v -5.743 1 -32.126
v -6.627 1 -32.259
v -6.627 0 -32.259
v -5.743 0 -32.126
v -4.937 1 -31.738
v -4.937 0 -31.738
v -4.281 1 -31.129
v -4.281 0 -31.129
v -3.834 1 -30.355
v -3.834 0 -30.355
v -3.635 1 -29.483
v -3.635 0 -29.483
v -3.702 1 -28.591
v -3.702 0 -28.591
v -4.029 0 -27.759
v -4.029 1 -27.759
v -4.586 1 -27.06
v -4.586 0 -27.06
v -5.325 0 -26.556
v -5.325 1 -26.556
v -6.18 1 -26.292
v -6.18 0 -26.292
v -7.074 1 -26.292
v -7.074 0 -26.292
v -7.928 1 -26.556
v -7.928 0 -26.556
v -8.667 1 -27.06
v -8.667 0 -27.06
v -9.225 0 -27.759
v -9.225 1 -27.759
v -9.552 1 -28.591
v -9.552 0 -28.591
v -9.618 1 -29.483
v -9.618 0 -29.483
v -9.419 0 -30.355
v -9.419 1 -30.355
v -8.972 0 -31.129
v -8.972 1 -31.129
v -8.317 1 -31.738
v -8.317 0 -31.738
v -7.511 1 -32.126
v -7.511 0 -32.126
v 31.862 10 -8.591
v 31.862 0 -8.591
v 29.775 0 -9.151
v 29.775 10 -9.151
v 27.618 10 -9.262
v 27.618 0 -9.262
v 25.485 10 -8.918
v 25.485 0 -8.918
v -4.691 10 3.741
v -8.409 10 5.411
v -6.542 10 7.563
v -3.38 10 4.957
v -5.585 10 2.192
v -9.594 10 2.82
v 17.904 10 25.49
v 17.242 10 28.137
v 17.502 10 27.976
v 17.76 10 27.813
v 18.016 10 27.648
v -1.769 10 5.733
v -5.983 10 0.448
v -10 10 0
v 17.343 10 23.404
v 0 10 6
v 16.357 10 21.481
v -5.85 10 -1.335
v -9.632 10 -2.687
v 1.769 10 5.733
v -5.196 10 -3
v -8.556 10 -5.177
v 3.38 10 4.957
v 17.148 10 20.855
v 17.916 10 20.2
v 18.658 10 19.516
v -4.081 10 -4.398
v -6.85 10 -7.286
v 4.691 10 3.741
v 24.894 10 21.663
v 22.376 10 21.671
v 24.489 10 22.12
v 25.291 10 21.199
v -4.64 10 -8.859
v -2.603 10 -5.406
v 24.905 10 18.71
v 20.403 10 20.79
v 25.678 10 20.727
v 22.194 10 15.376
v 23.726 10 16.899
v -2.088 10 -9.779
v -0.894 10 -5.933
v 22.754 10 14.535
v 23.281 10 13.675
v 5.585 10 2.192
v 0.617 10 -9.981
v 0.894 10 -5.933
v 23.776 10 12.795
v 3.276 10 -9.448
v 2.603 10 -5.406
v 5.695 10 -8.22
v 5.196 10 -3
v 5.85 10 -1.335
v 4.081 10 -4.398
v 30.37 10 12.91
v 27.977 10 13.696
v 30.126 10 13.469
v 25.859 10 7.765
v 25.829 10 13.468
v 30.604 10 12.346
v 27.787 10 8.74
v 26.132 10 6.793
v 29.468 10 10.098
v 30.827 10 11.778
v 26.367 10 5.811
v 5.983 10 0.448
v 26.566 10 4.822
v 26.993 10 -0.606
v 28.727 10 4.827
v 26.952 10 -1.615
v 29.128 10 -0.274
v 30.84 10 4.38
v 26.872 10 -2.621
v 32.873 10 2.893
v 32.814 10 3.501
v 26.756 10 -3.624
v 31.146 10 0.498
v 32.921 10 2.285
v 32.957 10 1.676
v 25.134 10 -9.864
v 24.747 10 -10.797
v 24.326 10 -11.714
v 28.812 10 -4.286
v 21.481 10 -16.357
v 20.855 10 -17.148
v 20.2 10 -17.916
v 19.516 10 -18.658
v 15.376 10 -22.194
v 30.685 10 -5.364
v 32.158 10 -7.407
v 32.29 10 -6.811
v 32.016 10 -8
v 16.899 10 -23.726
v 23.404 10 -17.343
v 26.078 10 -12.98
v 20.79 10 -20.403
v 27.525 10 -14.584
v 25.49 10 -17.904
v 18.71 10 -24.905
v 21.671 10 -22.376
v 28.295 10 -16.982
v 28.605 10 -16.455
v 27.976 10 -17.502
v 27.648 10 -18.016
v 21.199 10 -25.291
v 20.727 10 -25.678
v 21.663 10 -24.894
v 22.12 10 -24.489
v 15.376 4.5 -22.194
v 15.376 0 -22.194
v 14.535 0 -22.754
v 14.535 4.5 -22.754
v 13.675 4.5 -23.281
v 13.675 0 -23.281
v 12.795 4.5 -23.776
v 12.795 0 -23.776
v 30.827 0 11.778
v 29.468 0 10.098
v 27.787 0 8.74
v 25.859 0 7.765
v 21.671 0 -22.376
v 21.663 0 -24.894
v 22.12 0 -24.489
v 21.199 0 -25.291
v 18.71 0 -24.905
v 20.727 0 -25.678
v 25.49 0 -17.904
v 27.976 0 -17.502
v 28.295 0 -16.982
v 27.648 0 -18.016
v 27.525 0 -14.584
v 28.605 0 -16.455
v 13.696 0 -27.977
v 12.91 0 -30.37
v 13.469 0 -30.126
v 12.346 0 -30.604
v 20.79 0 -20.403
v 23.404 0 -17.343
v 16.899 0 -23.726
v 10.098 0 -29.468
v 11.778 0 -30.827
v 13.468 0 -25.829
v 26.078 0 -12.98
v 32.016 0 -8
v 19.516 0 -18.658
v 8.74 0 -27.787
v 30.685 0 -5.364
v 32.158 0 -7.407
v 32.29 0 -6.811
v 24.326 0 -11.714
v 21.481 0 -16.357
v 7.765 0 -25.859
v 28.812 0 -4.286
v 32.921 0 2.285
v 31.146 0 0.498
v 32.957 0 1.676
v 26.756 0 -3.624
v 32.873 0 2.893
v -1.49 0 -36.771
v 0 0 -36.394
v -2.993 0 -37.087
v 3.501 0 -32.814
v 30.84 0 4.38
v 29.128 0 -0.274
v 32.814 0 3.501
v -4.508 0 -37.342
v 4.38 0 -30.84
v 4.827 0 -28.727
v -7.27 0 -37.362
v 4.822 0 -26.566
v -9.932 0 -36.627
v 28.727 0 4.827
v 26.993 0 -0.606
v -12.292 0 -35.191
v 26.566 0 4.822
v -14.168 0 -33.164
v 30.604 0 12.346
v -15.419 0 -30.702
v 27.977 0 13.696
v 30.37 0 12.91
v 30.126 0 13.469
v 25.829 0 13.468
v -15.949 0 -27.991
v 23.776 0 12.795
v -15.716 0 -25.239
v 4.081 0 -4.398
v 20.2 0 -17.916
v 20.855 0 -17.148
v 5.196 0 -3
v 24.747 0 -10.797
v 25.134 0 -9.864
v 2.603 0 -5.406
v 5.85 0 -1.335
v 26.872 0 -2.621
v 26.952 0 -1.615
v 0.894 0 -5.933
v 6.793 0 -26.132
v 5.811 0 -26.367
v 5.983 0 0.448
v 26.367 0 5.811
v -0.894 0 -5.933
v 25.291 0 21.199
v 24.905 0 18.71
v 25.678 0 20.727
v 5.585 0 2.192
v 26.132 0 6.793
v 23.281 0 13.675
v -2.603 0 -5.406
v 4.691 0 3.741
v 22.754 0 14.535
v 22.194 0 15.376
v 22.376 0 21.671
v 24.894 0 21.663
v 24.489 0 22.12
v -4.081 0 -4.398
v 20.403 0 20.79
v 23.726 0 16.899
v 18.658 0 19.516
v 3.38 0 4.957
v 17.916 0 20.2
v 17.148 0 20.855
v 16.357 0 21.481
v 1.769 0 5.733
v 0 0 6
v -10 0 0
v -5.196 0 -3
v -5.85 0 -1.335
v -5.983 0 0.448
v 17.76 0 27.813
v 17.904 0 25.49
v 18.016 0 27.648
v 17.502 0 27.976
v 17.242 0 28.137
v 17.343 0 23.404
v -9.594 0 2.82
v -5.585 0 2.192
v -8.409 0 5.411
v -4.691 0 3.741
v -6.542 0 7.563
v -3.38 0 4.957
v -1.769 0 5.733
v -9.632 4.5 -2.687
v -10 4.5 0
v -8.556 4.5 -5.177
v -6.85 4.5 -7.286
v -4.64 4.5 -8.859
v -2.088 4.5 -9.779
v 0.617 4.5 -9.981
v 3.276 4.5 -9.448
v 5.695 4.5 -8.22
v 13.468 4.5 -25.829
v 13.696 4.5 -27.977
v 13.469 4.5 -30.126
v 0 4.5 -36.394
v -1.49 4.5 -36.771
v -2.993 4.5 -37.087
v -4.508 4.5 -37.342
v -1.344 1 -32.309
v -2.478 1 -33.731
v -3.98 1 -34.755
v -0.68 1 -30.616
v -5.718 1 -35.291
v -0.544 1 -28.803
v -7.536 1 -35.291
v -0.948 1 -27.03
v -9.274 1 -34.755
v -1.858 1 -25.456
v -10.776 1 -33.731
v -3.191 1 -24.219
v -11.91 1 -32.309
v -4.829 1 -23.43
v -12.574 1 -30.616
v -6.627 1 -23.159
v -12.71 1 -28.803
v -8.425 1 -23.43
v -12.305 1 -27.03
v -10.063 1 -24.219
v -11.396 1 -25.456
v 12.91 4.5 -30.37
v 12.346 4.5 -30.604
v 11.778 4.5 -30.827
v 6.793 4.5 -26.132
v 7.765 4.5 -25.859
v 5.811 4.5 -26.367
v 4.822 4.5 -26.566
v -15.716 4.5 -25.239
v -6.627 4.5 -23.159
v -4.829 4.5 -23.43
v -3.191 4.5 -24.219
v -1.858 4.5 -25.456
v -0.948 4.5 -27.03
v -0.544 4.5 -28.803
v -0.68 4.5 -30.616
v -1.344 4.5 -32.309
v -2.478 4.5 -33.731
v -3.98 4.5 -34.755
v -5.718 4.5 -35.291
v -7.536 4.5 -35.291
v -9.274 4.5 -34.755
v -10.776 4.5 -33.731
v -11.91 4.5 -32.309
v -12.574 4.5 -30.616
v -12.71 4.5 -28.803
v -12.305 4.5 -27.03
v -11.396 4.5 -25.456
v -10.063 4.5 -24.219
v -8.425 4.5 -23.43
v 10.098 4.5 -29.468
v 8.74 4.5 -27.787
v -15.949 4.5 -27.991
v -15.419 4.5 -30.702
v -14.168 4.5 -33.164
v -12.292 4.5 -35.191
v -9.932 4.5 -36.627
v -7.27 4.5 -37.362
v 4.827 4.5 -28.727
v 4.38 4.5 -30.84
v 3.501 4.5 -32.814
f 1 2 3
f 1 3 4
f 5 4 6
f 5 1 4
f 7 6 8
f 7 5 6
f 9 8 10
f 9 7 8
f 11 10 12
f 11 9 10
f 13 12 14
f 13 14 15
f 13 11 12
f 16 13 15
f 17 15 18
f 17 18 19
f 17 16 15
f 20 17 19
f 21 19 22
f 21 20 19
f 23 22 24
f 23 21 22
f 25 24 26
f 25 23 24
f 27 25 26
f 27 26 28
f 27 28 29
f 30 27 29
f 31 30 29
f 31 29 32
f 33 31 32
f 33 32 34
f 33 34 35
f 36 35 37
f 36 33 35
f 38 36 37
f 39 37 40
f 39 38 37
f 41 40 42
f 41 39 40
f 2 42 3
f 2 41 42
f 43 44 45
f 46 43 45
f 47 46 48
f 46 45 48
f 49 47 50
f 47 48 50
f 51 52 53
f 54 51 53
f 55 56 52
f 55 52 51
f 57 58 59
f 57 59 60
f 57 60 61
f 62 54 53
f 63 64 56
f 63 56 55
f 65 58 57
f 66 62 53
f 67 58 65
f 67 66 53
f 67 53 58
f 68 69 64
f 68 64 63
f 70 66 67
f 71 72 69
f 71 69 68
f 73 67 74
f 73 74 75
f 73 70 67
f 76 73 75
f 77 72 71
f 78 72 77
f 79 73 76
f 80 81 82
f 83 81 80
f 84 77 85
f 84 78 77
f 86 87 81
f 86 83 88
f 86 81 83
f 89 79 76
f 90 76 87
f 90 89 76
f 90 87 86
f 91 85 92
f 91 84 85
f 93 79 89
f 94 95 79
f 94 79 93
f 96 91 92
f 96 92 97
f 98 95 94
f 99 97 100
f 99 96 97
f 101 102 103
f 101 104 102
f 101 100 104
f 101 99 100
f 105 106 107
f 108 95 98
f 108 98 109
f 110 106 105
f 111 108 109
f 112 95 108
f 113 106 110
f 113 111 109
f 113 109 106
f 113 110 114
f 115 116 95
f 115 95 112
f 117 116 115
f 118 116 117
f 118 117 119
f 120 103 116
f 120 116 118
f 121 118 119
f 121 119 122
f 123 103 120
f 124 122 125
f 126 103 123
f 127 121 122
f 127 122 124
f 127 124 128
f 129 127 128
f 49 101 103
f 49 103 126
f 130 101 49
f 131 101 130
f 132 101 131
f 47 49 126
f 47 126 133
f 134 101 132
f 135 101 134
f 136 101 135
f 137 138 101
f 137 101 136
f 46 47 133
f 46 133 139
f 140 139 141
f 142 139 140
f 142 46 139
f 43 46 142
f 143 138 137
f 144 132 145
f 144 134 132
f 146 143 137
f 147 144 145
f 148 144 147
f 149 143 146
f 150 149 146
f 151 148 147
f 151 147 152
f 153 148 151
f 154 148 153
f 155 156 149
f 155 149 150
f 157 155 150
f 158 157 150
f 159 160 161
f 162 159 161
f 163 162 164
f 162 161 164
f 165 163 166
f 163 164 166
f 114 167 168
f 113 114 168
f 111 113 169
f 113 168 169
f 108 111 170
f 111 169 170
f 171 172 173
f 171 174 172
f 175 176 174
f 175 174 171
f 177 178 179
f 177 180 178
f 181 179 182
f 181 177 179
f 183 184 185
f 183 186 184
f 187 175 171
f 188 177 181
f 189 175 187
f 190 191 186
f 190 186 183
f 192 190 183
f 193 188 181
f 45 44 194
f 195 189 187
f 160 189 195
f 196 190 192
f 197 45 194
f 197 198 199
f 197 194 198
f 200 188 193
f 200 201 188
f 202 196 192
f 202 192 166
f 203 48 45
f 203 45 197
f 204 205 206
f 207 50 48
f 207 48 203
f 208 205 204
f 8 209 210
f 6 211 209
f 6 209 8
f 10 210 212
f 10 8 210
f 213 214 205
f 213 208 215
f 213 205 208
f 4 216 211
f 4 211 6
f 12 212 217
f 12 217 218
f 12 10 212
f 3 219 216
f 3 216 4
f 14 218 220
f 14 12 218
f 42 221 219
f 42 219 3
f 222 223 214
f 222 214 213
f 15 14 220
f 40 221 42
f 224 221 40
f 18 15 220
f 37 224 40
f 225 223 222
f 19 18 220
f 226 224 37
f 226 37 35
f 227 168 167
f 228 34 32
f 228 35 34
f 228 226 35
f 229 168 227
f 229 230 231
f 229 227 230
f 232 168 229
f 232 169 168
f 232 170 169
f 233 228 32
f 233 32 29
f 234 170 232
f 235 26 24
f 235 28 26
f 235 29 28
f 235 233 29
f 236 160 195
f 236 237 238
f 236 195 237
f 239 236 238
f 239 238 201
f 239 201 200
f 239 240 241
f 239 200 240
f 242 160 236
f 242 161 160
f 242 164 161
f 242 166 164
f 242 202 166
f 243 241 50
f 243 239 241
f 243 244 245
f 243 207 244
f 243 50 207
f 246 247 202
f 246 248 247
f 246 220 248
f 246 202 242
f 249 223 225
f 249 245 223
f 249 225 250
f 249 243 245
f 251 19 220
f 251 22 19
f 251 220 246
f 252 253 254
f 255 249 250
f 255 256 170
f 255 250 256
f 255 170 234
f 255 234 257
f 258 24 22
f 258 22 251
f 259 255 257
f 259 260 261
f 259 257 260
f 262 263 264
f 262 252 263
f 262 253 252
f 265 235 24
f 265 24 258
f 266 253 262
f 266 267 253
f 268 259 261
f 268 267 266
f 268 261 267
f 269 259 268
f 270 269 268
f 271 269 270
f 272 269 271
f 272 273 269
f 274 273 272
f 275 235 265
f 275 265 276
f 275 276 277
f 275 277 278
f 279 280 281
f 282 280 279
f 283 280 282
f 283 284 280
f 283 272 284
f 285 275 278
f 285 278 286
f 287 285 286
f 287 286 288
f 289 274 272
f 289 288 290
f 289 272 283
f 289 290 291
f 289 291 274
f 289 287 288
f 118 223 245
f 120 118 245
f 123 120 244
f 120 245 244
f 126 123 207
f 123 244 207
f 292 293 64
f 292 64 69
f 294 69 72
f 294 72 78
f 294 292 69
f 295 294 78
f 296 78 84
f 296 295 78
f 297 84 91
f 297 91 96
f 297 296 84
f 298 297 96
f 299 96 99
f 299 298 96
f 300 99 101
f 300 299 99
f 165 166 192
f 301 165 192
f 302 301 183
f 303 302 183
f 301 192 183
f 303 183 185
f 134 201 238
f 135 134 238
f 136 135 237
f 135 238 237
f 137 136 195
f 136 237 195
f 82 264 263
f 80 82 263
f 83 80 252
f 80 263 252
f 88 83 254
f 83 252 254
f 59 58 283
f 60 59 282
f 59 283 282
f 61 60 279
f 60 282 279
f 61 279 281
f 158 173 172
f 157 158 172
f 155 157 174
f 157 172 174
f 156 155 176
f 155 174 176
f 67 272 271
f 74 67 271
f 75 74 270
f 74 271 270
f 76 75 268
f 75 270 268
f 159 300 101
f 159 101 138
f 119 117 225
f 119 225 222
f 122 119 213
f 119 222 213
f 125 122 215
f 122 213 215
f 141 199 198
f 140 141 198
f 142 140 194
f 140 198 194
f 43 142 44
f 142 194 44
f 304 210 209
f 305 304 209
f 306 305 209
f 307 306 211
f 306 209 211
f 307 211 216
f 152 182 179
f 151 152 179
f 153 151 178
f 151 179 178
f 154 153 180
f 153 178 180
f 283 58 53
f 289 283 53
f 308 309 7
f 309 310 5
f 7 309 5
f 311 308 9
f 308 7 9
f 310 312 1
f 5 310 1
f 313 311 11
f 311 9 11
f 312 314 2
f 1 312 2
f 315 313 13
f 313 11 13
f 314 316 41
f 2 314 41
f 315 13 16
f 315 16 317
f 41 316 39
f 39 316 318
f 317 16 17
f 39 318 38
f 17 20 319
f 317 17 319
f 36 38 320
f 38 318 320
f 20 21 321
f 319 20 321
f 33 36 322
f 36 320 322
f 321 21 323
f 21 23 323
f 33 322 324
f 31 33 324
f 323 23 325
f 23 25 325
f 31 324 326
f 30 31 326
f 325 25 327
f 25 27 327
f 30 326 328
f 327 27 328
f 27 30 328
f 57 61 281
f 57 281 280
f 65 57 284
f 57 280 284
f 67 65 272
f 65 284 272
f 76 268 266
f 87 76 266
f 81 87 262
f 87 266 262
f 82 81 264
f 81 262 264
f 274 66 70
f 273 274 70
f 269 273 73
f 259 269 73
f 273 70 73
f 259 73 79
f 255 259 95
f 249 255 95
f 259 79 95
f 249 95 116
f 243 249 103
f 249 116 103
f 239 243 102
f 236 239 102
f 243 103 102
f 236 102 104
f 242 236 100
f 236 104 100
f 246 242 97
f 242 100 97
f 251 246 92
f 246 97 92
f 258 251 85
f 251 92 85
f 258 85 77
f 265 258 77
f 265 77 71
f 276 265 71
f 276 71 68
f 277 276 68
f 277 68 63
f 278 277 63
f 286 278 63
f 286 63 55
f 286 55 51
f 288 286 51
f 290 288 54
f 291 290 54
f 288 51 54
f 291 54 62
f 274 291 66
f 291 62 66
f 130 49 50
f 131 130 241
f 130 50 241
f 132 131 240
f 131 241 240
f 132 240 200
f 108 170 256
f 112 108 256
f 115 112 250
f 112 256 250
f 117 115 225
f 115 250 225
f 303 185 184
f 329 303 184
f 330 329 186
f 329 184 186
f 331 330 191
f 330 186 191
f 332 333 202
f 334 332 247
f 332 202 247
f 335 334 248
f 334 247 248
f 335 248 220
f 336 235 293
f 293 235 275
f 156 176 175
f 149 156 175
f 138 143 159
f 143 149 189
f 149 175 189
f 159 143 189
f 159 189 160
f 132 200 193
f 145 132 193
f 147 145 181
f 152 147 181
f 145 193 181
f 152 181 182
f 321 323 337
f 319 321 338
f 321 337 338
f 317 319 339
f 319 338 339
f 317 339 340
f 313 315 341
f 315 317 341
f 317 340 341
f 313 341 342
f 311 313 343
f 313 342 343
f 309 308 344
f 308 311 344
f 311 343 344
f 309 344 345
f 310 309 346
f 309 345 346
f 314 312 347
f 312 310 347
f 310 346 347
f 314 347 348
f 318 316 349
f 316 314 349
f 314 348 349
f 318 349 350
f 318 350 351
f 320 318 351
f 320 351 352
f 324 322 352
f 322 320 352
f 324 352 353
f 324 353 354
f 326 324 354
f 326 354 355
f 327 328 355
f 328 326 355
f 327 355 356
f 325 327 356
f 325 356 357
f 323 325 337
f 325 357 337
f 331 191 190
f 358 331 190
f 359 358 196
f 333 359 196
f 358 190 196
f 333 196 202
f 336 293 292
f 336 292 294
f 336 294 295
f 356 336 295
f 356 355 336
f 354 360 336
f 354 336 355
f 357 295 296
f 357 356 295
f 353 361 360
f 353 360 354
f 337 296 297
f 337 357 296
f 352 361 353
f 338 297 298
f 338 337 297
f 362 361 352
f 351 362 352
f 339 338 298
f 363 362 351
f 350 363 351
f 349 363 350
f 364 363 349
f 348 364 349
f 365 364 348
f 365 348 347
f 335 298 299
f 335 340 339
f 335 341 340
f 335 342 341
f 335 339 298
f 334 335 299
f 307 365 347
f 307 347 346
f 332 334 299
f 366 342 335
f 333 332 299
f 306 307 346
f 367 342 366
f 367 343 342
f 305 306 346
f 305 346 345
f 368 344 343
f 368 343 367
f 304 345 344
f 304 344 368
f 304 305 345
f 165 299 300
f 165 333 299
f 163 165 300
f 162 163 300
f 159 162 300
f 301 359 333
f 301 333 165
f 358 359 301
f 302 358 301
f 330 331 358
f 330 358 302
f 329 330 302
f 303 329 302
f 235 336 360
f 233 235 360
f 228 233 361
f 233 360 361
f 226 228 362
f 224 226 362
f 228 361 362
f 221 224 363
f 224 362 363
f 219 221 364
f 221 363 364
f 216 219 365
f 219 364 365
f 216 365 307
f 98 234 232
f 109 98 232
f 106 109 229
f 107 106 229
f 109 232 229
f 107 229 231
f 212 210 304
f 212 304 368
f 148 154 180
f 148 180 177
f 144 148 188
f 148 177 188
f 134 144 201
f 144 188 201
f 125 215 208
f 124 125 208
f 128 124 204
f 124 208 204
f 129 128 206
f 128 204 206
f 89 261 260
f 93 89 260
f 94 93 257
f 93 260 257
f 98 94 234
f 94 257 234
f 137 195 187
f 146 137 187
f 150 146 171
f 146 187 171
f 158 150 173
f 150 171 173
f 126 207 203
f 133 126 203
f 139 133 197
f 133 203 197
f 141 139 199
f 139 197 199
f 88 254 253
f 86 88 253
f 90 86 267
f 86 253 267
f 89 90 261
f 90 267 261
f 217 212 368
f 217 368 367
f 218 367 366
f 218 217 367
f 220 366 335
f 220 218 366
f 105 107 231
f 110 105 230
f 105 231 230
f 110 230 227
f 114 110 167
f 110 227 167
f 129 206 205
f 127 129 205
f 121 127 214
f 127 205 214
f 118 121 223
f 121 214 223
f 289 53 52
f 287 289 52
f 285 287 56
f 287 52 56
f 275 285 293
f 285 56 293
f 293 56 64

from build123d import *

# Parameters (mm, degrees)
SKETCH_1_R          = 27
EXTRUDE_2_DEPTH     = 10
EXTRUDE_START       = -10
EXTRUDE_3_DEPTH     = 10
CUT_EXTRUDE_2_DEPTH = 48.669538272
SKETCH_6_R          = 6
CUT_EXTRUDE_3_DEPTH = 10
EXTRUDE_5_DEPTH     = 10
SKETCH_10_R         = 6.1
CUT_EXTRUDE_5_DEPTH = 10
CUT_EXTRUDE_START   = -10
CUT_EXTRUDE_6_DEPTH = 10
FILLET_1_R          = 10
CUT_EXTRUDE_START_2 = -5.5
SKETCH_14_R         = 6.1
CUT_EXTRUDE_7_DEPTH = 5.5
EXTRUDE_START_2     = -1
SKETCH_15_R         = 6.1
SKETCH_15_R_2       = 3
EXTRUDE_6_DEPTH     = 1


with BuildPart() as part:
    # 草图1 → 凸台-拉伸2 (new body)
    with BuildSketch(Plane(origin=(0, 0, 0), x_dir=(1, 0, 0), z_dir=(0, 1, 0))):
        with Locations(Location((0, 0, 0), (0, 0, 270))):
            Circle(SKETCH_1_R)
    extrude(amount=EXTRUDE_2_DEPTH)

    # 草图3 → 凸台-拉伸3 (add)
    with BuildSketch(Plane(origin=(0, 10, 0), x_dir=(1, 0, 0), z_dir=(0, 1, 0)).offset(EXTRUDE_START)):
        with BuildLine():
            ThreePointArc((-3.623654542, 26.755730746), (-4.775668185, 29.776890365), (-6.810627033, 32.289554959))
            ThreePointArc((-6.810627033, 32.289554959), (-7.703697007, 32.088207373), (-8.590838072, 31.862164101))
            ThreePointArc((-8.590838072, 31.862164101), (-9.263273827, 28.699511571), (-8.918147734, 25.484635391))
            ThreePointArc((-8.918147734, 25.484635391), (-6.303024824, 26.253987851), (-3.623654542, 26.755730746))
        make_face()
        with BuildLine():
            ThreePointArc((-11.714275763, 24.326441239), (-13.743495509, 26.843742988), (-16.455312443, 28.604592156))
            ThreePointArc((-16.455312443, 28.604592156), (-17.242452636, 28.137125424), (-18.016322714, 27.648003832))
            ThreePointArc((-18.016322714, 27.648003832), (-17.678533741, 24.432348458), (-16.356847947, 21.481469346))
            ThreePointArc((-16.356847947, 21.481469346), (-14.107461247, 23.021284438), (-11.714275763, 24.326441239))
        make_face()
        with BuildLine():
            ThreePointArc((-18.658222053, 19.515910171), (-21.366013737, 21.282943016), (-24.48923722, 22.119612574))
            ThreePointArc((-24.48923722, 22.119612574), (-25.093396865, 21.431785595), (-25.678244161, 20.727464312))
            ThreePointArc((-25.678244161, 20.727464312), (-24.363295599, 17.773576848), (-22.194425918, 15.375547411))
            ThreePointArc((-22.194425918, 15.375547411), (-20.530961071, 17.535097305), (-18.658222053, 19.515910171))
        make_face()
        with BuildLine():
            ThreePointArc((-23.77577157, 12.79502584), (-26.897077674, 13.638820294), (-30.125984831, 13.469411196))
            ThreePointArc((-30.125984831, 13.469411196), (-30.488024573, 12.628553268), (-30.826600159, 11.777976169))
            ThreePointArc((-30.826600159, 11.777976169), (-28.663208335, 9.3750037), (-25.859458842, 7.764559768))
            ThreePointArc((-25.859458842, 7.764559768), (-24.944747378, 10.332452674), (-23.77577157, 12.79502584))
        make_face()
        with BuildLine():
            ThreePointArc((-26.56598291, 4.821675232), (-29.795268245, 4.659634815), (-32.813791147, 3.500730003))
            ThreePointArc((-32.813791147, 3.500730003), (-32.898272013, 2.589150159), (-32.957433752, 1.675577656))
            ThreePointArc((-32.957433752, 1.675577656), (-30.15736653, 0.05873987), (-26.993187762, -0.606477084))
            ThreePointArc((-26.993187762, -0.606477084), (-26.916768011, 2.118395585), (-26.56598291, 4.821675232))
        make_face()
        with BuildLine():
            ThreePointArc((-32.289554959, -6.810627033), (-32.088207373, -7.703697007), (-31.862164101, -8.590838072))
            ThreePointArc((-31.862164101, -8.590838072), (-28.699511571, -9.263273827), (-25.484635391, -8.918147734))
            ThreePointArc((-25.484635391, -8.918147734), (-26.253987851, -6.303024824), (-26.755730746, -3.623654542))
            ThreePointArc((-26.755730746, -3.623654542), (-29.776890365, -4.775668185), (-32.289554959, -6.810627033))
        make_face()
        with BuildLine():
            ThreePointArc((-28.604592156, -16.455312443), (-28.137125424, -17.242452636), (-27.648003832, -18.016322714))
            ThreePointArc((-27.648003832, -18.016322714), (-24.432348458, -17.678533741), (-21.481469346, -16.356847947))
            ThreePointArc((-21.481469346, -16.356847947), (-23.021284438, -14.107461247), (-24.326441239, -11.714275763))
            ThreePointArc((-24.326441239, -11.714275763), (-26.843742988, -13.743495509), (-28.604592156, -16.455312443))
        make_face()
        with BuildLine():
            ThreePointArc((-22.119612574, -24.48923722), (-21.431785595, -25.093396865), (-20.727464312, -25.678244161))
            ThreePointArc((-20.727464312, -25.678244161), (-17.773576848, -24.363295599), (-15.375547411, -22.194425918))
            ThreePointArc((-15.375547411, -22.194425918), (-17.535097305, -20.530961071), (-19.515910171, -18.658222053))
            ThreePointArc((-19.515910171, -18.658222053), (-21.282943016, -21.366013737), (-22.119612574, -24.48923722))
        make_face()
        with BuildLine():
            ThreePointArc((-13.469411196, -30.125984831), (-12.628553268, -30.488024573), (-11.777976169, -30.826600159))
            ThreePointArc((-11.777976169, -30.826600159), (-9.3750037, -28.663208335), (-7.764559768, -25.859458842))
            ThreePointArc((-7.764559768, -25.859458842), (-10.332452674, -24.944747378), (-12.79502584, -23.77577157))
            ThreePointArc((-12.79502584, -23.77577157), (-13.638820294, -26.897077674), (-13.469411196, -30.125984831))
        make_face()
        with BuildLine():
            ThreePointArc((-3.500730003, -32.813791147), (-2.589150159, -32.898272013), (-1.675577656, -32.957433752))
            ThreePointArc((-1.675577656, -32.957433752), (-0.05873987, -30.15736653), (0.606477084, -26.993187762))
            ThreePointArc((0.606477084, -26.993187762), (-2.118395585, -26.916768011), (-4.821675232, -26.56598291))
            ThreePointArc((-4.821675232, -26.56598291), (-4.659634815, -29.795268245), (-3.500730003, -32.813791147))
        make_face()
        with BuildLine():
            ThreePointArc((6.810627033, -32.289554959), (7.703697007, -32.088207373), (8.590838072, -31.862164101))
            ThreePointArc((8.590838072, -31.862164101), (9.263273827, -28.699511571), (8.918147734, -25.484635391))
            ThreePointArc((8.918147734, -25.484635391), (6.303024824, -26.253987851), (3.623654542, -26.755730746))
            ThreePointArc((3.623654542, -26.755730746), (4.775668185, -29.776890365), (6.810627033, -32.289554959))
        make_face()
        with BuildLine():
            ThreePointArc((16.455312443, -28.604592156), (17.242452636, -28.137125424), (18.016322714, -27.648003832))
            ThreePointArc((18.016322714, -27.648003832), (17.678533741, -24.432348458), (16.356847947, -21.481469346))
            ThreePointArc((16.356847947, -21.481469346), (14.107461247, -23.021284438), (11.714275763, -24.326441239))
            ThreePointArc((11.714275763, -24.326441239), (13.743495509, -26.843742988), (16.455312443, -28.604592156))
        make_face()
        with BuildLine():
            ThreePointArc((24.48923722, -22.119612574), (25.093396865, -21.431785595), (25.678244161, -20.727464312))
            ThreePointArc((25.678244161, -20.727464312), (24.363295599, -17.773576848), (22.194425918, -15.375547411))
            ThreePointArc((22.194425918, -15.375547411), (20.530961071, -17.535097305), (18.658222053, -19.515910171))
            ThreePointArc((18.658222053, -19.515910171), (21.366013737, -21.282943016), (24.48923722, -22.119612574))
        make_face()
        with BuildLine():
            ThreePointArc((30.125984831, -13.469411196), (30.488024573, -12.628553268), (30.826600159, -11.777976169))
            ThreePointArc((30.826600159, -11.777976169), (28.663208335, -9.3750037), (25.859458842, -7.764559768))
            ThreePointArc((25.859458842, -7.764559768), (24.944747378, -10.332452674), (23.77577157, -12.79502584))
            ThreePointArc((23.77577157, -12.79502584), (26.897077674, -13.638820294), (30.125984831, -13.469411196))
        make_face()
        with BuildLine():
            ThreePointArc((32.813791147, -3.500730003), (32.898272013, -2.589150159), (32.957433752, -1.675577656))
            ThreePointArc((32.957433752, -1.675577656), (30.15736653, -0.05873987), (26.993187762, 0.606477084))
            ThreePointArc((26.993187762, 0.606477084), (26.998296887, 0.303257671), (27, 0))
            ThreePointArc((27, 0), (26.891276825, -2.420584789), (26.56598291, -4.821675232))
            ThreePointArc((26.56598291, -4.821675232), (29.795268245, -4.659634815), (32.813791147, -3.500730003))
        make_face()
        with BuildLine():
            ThreePointArc((26.755730746, 3.623654542), (29.776890365, 4.775668185), (32.289554959, 6.810627033))
            ThreePointArc((32.289554959, 6.810627033), (32.088207373, 7.703697007), (31.862164101, 8.590838072))
            ThreePointArc((31.862164101, 8.590838072), (28.699511571, 9.263273827), (25.484635391, 8.918147734))
            ThreePointArc((25.484635391, 8.918147734), (26.253987851, 6.303024824), (26.755730746, 3.623654542))
        make_face()
        with BuildLine():
            ThreePointArc((24.326441239, 11.714275763), (26.843742988, 13.743495509), (28.604592156, 16.455312443))
            ThreePointArc((28.604592156, 16.455312443), (28.137125424, 17.242452636), (27.648003832, 18.016322714))
            ThreePointArc((27.648003832, 18.016322714), (24.432348458, 17.678533741), (21.481469346, 16.356847947))
            ThreePointArc((21.481469346, 16.356847947), (23.021284438, 14.107461247), (24.326441239, 11.714275763))
        make_face()
        with BuildLine():
            ThreePointArc((19.515910171, 18.658222053), (21.282943016, 21.366013737), (22.119612574, 24.48923722))
            ThreePointArc((22.119612574, 24.48923722), (21.431785595, 25.093396865), (20.727464312, 25.678244161))
            ThreePointArc((20.727464312, 25.678244161), (17.773576848, 24.363295599), (15.375547411, 22.194425918))
            ThreePointArc((15.375547411, 22.194425918), (17.535097305, 20.530961071), (19.515910171, 18.658222053))
        make_face()
        with BuildLine():
            ThreePointArc((12.79502584, 23.77577157), (13.638820294, 26.897077674), (13.469411196, 30.125984831))
            ThreePointArc((13.469411196, 30.125984831), (12.628553268, 30.488024573), (11.777976169, 30.826600159))
            ThreePointArc((11.777976169, 30.826600159), (9.3750037, 28.663208335), (7.764559768, 25.859458842))
            ThreePointArc((7.764559768, 25.859458842), (10.332452674, 24.944747378), (12.79502584, 23.77577157))
        make_face()
        with BuildLine():
            ThreePointArc((4.821675232, 26.56598291), (4.659634815, 29.795268245), (3.500730003, 32.813791147))
            ThreePointArc((3.500730003, 32.813791147), (2.589150159, 32.898272013), (1.675577656, 32.957433752))
            ThreePointArc((1.675577656, 32.957433752), (0.05873987, 30.15736653), (-0.606477084, 26.993187762))
            ThreePointArc((-0.606477084, 26.993187762), (2.118395585, 26.916768011), (4.821675232, 26.56598291))
        make_face()
    extrude(amount=EXTRUDE_3_DEPTH)

    # 草图4 → 切除-拉伸2 (cut, through all)
    with BuildSketch(Plane(origin=(0, 10, 0), x_dir=(1, 0, 0), z_dir=(0, 1, 0))):
        with BuildLine():
            Line((68.70942434, -72.656830422), (-6.542169106, -7.563069707))
            ThreePointArc((-6.542169106, -7.563069707), (-9.614988938, -2.748088014), (-9.550796477, 2.963492306))
            Line((-9.550796477, 2.963492306), (-2.118395585, 26.916768011))
            Line((-2.118395585, 26.916768011), (19.935579671, 97.992717399))
            ThreePointArc((19.935579671, 97.992717399), (-96.149889375, -27.480880138), (68.70942434, -72.656830422))
        make_face()
    extrude(amount=-CUT_EXTRUDE_2_DEPTH, mode=Mode.SUBTRACT)

    # 草图6 → 切除-拉伸3 (cut)
    with BuildSketch(Plane(origin=(0, 10, 0), x_dir=(1, 0, 0), z_dir=(0, 1, 0))):
        with Locations(Location((0, 0, 0), (0, 0, 270))):
            Circle(SKETCH_6_R)
    extrude(amount=-CUT_EXTRUDE_3_DEPTH, mode=Mode.SUBTRACT)

    # 草图9 → 凸台-拉伸5 (add)
    with BuildSketch(Plane(origin=(0, 10, 0), x_dir=(1, 0, 0), z_dir=(0, 1, 0)).offset(EXTRUDE_START)):
        with BuildLine():
            Line((-18.337271569, 36.810995995), (-10, 0))
            ThreePointArc((-10, 0), (-9.887061363, 1.49867195), (-9.550796477, 2.963492306))
            Line((-9.550796477, 2.963492306), (-2.118395585, 26.916768011))
            ThreePointArc((-2.118395585, 26.916768011), (-1.362972032, 26.965576338), (-0.606477084, 26.993187762))
            ThreePointArc((-0.606477084, 26.993187762), (0.05873987, 30.15736653), (1.675577656, 32.957433752))
            ThreePointArc((1.675577656, 32.957433752), (2.589150159, 32.898272013), (3.500730003, 32.813791147))
            ThreePointArc((3.500730003, 32.813791147), (4.659634815, 29.795268245), (4.821675232, 26.56598291))
            Line((4.821675232, 26.56598291), (7.168022985, 33.612773021))
            ThreePointArc((7.168022985, 33.612773021), (-5.303969741, 37.450057719), (-18.337271569, 36.810995995))
        make_face()
    extrude(amount=EXTRUDE_5_DEPTH)

    # 草图10 → 切除-拉伸5 (cut)
    with BuildSketch(Plane(origin=(0, 10, 0), x_dir=(1, 0, 0), z_dir=(0, 1, 0))):
        with Locations(Location((-6.626815852, 29.258935587, 0), (0, 0, 270))):
            Circle(SKETCH_10_R)
    extrude(amount=-CUT_EXTRUDE_5_DEPTH, mode=Mode.SUBTRACT)

    # 草图11 → 切除-拉伸6 (cut)
    with BuildSketch(Plane(origin=(0, 10, 0), x_dir=(1, 0, 0), z_dir=(0, 1, 0)).offset(CUT_EXTRUDE_START)):
        with BuildLine():
            Line((0, 36.394498532), (3.500730003, 32.813791147))
            ThreePointArc((3.500730003, 32.813791147), (4.659634815, 29.795268245), (4.821675232, 26.56598291))
            Line((4.821675232, 26.56598291), (7.168022985, 33.612773021))
            ThreePointArc((7.168022985, 33.612773021), (3.655030847, 35.186640305), (0, 36.394498532))
        make_face()
    extrude(amount=CUT_EXTRUDE_6_DEPTH, mode=Mode.SUBTRACT)

    # 圆角1
    fillet_1_edges = [part.edges().sort_by_distance(p)[0] for p in [
        (-18.337271569, 5, -36.810995995),
    ]]
    fillet(fillet_1_edges, radius=FILLET_1_R)

    # 草图14 → 切除-拉伸7 (cut)
    with BuildSketch(Plane(origin=(0, 10, 0), x_dir=(1, 0, 0), z_dir=(0, 1, 0)).offset(CUT_EXTRUDE_START_2)):
        with BuildLine():
            Line((5.694647189, 8.220157747), (15.375547411, 22.194425918))
            ThreePointArc((15.375547411, 22.194425918), (14.107461247, 23.021284438), (12.79502584, 23.77577157))
            ThreePointArc((12.79502584, 23.77577157), (13.638820294, 26.897077674), (13.469411196, 30.125984831))
            ThreePointArc((13.469411196, 30.125984831), (12.628553268, 30.488024573), (11.777976169, 30.826600159))
            ThreePointArc((11.777976169, 30.826600159), (9.3750037, 28.663208335), (7.764559768, 25.859458842))
            ThreePointArc((7.764559768, 25.859458842), (6.303024824, 26.253987851), (4.821675232, 26.56598291))
            ThreePointArc((4.821675232, 26.56598291), (4.659634815, 29.795268245), (3.500730003, 32.813791147))
            Line((3.500730003, 32.813791147), (0, 36.394498532))
            ThreePointArc((0, 36.394498532), (-2.23974925, 36.936946702), (-4.508428545, 37.341694744))
            ThreePointArc((-4.508428545, 37.341694744), (-13.300434171, 34.242814336), (-15.716384779, 25.239170332))
            Line((-15.716384779, 25.239170332), (-10, 0))
            ThreePointArc((-10, 0), (-4.639694392, 8.858512062), (5.694647189, 8.220157747))
        make_face()
        with Locations(Location((-6.626815852, 29.258935587, 0), (0, 0, 270))):
            Circle(SKETCH_14_R, mode=Mode.SUBTRACT)
    extrude(amount=CUT_EXTRUDE_7_DEPTH, mode=Mode.SUBTRACT)

    # 草图15 → 凸台-拉伸6 (add)
    with BuildSketch(Plane.XZ.offset(EXTRUDE_START_2)):
        with Locations(Location((-6.626815852, -29.258935587, 0), (0, 0, 90))):
            Circle(SKETCH_15_R)
        with Locations(Location((-6.626815852, -29.258935587, 0), (0, 0, 270))):
            Circle(SKETCH_15_R_2, mode=Mode.SUBTRACT)
    extrude(amount=EXTRUDE_6_DEPTH)


solid = part.part
